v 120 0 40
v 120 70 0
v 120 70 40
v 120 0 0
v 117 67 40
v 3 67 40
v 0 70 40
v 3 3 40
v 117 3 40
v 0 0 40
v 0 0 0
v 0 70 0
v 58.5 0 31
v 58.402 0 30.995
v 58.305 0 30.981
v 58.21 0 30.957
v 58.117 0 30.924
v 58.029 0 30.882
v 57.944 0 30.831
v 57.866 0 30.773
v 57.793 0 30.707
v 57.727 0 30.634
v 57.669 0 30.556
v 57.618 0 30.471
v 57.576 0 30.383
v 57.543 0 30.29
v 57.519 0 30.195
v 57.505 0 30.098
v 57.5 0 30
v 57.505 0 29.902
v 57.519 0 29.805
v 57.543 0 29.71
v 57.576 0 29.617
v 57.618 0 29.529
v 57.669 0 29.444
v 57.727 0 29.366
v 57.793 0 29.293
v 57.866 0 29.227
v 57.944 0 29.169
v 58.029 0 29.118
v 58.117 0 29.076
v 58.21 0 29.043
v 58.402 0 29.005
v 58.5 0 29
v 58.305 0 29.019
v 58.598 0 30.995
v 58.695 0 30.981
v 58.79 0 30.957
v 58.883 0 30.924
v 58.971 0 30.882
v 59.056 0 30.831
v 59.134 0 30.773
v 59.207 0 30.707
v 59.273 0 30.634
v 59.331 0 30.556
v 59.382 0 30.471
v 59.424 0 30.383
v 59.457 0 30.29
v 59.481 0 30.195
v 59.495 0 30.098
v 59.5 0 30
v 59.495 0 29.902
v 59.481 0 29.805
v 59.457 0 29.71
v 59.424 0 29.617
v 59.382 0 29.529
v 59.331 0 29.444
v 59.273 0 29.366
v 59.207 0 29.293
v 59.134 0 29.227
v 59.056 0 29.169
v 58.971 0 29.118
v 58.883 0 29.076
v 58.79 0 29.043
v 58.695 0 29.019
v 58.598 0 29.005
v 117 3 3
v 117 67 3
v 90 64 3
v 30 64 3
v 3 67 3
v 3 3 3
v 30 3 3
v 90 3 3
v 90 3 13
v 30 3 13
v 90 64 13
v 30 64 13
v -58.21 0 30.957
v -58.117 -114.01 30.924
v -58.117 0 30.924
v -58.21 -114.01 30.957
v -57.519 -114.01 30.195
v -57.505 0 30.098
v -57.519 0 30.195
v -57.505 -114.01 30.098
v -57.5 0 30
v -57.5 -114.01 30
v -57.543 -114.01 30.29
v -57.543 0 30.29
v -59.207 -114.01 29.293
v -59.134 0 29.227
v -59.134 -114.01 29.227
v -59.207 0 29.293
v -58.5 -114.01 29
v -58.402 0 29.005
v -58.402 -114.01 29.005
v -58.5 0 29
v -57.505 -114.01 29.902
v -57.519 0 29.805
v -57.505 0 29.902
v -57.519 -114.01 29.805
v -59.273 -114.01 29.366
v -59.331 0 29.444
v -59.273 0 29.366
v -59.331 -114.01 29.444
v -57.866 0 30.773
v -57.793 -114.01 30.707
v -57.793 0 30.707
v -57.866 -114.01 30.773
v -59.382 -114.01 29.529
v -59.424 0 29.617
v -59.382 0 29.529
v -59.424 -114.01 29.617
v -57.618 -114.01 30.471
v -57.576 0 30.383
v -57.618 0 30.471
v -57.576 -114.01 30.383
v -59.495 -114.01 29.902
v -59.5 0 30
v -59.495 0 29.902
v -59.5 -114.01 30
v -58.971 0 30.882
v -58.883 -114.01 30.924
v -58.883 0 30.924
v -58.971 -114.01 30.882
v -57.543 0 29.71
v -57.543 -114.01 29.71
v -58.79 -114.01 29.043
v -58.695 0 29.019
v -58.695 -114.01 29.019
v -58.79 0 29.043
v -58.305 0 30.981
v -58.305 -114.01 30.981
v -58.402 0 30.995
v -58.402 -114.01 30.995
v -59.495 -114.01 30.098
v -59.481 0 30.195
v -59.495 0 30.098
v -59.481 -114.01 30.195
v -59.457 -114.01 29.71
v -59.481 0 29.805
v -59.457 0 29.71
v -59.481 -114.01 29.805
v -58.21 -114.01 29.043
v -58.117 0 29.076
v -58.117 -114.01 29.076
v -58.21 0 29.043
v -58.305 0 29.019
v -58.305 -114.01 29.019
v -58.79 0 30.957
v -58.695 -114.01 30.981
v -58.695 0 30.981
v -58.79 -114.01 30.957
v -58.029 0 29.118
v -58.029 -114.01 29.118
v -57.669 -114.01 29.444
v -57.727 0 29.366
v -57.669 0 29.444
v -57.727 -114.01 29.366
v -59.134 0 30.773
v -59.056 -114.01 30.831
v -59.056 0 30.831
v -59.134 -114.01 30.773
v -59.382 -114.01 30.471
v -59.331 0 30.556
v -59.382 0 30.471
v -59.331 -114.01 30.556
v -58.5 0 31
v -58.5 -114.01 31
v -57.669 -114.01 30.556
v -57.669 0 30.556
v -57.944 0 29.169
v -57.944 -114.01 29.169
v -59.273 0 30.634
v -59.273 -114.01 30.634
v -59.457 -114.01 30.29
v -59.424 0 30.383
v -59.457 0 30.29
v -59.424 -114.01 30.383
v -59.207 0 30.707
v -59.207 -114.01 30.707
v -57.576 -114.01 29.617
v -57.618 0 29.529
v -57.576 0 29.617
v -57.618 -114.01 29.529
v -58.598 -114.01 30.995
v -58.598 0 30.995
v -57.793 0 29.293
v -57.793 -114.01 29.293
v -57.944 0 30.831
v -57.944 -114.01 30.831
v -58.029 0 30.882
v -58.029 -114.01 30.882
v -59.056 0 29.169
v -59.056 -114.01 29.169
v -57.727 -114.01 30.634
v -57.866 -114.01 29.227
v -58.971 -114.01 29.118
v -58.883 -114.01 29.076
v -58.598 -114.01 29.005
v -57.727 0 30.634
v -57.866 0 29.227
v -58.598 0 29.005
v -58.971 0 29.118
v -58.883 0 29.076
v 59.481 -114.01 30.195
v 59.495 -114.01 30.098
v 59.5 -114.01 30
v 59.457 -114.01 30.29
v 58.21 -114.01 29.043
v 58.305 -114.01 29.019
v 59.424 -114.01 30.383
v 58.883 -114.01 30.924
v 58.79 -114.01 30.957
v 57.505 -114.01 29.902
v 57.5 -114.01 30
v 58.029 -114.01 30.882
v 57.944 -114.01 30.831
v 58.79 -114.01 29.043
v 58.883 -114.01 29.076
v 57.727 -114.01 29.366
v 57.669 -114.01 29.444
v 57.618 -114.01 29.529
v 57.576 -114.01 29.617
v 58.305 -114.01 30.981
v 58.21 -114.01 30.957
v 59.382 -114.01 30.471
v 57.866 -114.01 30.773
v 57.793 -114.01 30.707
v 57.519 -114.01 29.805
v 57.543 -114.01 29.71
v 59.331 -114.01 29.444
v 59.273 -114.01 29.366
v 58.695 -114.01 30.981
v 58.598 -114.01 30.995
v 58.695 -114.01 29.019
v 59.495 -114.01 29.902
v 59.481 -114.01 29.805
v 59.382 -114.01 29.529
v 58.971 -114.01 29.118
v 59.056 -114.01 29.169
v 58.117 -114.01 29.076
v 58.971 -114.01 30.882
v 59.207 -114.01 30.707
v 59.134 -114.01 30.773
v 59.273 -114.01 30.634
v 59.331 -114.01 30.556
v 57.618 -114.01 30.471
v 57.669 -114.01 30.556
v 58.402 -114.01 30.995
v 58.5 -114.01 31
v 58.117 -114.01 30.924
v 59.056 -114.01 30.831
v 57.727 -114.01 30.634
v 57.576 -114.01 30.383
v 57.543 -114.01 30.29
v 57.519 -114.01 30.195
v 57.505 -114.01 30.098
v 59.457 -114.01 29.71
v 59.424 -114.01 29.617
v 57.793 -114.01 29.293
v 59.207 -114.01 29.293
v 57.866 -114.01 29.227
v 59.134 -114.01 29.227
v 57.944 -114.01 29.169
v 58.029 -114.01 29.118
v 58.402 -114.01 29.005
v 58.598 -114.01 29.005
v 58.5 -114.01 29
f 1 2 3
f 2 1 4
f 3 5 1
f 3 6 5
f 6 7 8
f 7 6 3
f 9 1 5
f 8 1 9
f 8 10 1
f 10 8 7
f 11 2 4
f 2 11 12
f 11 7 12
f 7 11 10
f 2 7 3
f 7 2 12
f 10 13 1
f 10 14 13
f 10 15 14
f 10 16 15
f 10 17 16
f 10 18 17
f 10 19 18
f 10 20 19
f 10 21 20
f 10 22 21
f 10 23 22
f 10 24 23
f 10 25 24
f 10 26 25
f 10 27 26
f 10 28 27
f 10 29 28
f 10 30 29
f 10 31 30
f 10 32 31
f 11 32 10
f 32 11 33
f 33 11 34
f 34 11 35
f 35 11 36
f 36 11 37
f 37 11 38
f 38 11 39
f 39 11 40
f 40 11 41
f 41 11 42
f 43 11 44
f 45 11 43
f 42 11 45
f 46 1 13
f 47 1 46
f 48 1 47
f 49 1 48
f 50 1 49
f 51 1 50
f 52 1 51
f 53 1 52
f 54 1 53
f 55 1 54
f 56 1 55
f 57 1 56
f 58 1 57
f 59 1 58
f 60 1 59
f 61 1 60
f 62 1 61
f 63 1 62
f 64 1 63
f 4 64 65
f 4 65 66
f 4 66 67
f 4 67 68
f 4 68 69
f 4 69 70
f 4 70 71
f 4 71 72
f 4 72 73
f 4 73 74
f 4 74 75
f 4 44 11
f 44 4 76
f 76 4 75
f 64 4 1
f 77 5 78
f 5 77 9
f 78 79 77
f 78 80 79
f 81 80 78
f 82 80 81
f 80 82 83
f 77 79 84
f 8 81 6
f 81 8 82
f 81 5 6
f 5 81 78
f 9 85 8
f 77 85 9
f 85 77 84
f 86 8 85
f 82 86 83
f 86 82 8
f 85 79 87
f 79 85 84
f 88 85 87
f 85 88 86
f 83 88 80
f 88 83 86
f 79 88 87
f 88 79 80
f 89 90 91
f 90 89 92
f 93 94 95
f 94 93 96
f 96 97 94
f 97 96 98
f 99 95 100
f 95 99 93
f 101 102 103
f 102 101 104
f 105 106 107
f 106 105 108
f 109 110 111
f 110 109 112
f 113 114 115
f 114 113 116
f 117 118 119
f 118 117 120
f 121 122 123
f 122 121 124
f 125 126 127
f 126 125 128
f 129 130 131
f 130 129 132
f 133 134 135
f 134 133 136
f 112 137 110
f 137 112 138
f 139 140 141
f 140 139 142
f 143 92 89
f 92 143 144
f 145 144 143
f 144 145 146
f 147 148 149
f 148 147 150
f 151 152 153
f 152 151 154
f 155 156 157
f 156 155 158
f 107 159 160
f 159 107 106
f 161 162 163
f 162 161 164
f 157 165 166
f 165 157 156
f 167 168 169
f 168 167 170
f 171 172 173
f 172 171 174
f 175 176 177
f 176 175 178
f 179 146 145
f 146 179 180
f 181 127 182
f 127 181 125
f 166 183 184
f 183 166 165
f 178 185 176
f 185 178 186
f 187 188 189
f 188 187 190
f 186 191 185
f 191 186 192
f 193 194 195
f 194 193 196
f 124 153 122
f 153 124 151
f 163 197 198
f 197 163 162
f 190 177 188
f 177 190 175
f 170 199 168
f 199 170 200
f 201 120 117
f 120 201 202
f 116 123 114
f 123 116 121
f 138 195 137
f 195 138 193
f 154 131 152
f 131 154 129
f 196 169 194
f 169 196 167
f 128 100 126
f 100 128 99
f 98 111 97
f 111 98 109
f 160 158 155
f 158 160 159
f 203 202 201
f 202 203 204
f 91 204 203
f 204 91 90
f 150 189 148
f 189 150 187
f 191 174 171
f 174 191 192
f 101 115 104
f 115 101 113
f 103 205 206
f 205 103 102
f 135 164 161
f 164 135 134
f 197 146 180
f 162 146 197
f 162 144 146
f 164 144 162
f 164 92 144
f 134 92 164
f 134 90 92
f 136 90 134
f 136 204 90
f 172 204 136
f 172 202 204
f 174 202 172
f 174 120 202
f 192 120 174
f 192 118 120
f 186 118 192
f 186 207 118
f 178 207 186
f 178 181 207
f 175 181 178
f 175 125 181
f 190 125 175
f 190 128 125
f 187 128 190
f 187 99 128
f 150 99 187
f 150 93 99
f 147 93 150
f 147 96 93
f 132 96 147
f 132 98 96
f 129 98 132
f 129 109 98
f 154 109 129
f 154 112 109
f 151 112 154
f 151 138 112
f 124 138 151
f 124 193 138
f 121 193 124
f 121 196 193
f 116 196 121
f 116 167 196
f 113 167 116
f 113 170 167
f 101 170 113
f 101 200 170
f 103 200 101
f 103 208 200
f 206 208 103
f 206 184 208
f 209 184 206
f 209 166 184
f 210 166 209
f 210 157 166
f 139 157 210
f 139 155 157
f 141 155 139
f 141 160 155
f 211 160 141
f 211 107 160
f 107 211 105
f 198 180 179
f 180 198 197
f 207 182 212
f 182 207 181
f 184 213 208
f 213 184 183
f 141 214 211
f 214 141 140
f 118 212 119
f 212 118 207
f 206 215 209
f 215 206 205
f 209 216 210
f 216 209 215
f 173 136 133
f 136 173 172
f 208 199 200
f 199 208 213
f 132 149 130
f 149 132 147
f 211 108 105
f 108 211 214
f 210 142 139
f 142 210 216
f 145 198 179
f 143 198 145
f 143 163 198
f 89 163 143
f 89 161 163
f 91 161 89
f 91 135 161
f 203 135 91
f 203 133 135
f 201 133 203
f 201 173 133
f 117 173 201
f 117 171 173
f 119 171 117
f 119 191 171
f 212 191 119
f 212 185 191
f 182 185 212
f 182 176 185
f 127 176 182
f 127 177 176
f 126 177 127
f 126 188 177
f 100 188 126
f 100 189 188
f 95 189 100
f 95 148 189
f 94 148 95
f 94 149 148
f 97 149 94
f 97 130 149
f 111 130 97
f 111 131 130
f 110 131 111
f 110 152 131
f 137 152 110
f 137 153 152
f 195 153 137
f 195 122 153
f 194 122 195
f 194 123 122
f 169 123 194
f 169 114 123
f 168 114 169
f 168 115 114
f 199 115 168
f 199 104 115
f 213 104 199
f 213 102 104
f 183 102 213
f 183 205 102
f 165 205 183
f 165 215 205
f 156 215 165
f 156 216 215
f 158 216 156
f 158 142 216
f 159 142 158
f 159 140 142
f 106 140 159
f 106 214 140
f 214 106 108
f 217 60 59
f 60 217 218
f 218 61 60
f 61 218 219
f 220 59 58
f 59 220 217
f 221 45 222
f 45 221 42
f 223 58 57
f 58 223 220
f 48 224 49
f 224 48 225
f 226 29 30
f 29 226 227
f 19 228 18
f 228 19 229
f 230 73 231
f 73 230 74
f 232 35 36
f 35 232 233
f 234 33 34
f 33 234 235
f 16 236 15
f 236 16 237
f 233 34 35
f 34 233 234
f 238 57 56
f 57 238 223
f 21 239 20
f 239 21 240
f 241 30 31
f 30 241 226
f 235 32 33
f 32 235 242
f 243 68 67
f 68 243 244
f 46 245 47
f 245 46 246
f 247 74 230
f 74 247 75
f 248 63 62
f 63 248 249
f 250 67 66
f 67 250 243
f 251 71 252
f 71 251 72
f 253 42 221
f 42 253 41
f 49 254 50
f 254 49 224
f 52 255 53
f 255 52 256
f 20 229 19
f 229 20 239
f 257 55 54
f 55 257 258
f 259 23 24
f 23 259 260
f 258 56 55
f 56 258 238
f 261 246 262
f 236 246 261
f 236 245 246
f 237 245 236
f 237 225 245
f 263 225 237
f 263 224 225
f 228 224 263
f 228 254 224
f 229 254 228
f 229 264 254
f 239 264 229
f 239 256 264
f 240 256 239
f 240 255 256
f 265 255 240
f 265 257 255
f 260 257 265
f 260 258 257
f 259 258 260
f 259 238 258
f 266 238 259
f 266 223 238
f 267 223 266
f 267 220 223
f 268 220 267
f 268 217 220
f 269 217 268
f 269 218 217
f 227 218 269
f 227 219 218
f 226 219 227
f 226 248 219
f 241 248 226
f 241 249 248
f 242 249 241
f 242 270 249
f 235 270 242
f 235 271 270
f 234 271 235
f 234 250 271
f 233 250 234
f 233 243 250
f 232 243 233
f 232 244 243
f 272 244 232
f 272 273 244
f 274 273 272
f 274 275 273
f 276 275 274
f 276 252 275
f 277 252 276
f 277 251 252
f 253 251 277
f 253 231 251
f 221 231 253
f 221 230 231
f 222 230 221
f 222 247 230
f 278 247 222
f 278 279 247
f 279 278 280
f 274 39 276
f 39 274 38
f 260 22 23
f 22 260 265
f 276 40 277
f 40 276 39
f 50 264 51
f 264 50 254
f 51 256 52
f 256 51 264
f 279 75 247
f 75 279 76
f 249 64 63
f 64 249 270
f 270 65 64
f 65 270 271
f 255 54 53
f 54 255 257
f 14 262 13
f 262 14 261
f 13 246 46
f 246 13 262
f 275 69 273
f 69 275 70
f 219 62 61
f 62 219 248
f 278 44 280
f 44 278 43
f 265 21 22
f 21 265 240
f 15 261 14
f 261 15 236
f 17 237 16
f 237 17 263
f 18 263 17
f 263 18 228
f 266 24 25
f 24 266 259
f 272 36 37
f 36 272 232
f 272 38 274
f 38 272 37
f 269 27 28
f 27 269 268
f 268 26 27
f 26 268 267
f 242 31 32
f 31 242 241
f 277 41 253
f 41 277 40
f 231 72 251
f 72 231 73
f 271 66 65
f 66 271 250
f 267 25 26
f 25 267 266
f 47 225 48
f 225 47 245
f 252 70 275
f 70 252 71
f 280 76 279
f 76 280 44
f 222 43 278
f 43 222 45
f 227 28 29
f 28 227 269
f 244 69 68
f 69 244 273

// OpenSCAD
// Buffer tank for mini horizontal gel-electrophoresis box
// Dimensions in mm

// Outer dimensions
outer_x = 120;
outer_y = 70;
outer_z = 40;

// Wall and floor thickness
wall_thickness = 3;
floor_thickness = 3;

// Platform dimensions
platform_x = 60;
platform_y = outer_y - 2 * wall_thickness; // Spans full inner width
platform_top_z = 13; // Top of platform is at z = 13
platform_bottom_z = floor_thickness; // Bottom of platform is at floor level

// Electrode hole dimensions
hole_diameter = 2;
hole_z = 30;
hole_y = 0;

// Calculate inner dimensions
inner_x = outer_x - 2 * wall_thickness;
inner_y = outer_y - 2 * wall_thickness;

// Calculate platform start and end in X (centred)
platform_start_x = (outer_x - platform_x) / 2;
platform_end_x = platform_start_x + platform_x;

// Calculate inner chamber lengths
chamber_length = (inner_x - platform_x) / 2;

// Build the tank
module buffer_tank() {
    union() {
        // Main tank body (outer shell)
        difference() {
            // Outer box
            cube([outer_x, outer_y, outer_z], center = false);
            
            // Inner cavity (subtract inner volume)
            translate([wall_thickness, wall_thickness, floor_thickness]) {
                cube([inner_x, inner_y, outer_z - floor_thickness], center = false);
            }
        }
        
        // Raised platform for gel tray
        translate([platform_start_x, 0, platform_bottom_z]) {
            cube([platform_x, platform_y, platform_top_z - platform_bottom_z], center = false);
        }
    }
    
    // Electrode holes through end walls
    // Left end wall hole
    translate([-outer_x/2 + wall_thickness/2, hole_y, hole_z]) {
        rotate([90, 0, 0]) {
            cylinder(d = hole_diameter, h = outer_x - 2 * wall_thickness + 0.01, center = false);
        }
    }
    
    // Right end wall hole
    translate([outer_x/2 - wall_thickness/2, hole_y, hole_z]) {
        rotate([90, 0, 0]) {
            cylinder(d = hole_diameter, h = outer_x - 2 * wall_thickness + 0.01, center = false);
        }
    }
}

// Set global resolution
$fn = 64;

// Render the part
buffer_tank();
